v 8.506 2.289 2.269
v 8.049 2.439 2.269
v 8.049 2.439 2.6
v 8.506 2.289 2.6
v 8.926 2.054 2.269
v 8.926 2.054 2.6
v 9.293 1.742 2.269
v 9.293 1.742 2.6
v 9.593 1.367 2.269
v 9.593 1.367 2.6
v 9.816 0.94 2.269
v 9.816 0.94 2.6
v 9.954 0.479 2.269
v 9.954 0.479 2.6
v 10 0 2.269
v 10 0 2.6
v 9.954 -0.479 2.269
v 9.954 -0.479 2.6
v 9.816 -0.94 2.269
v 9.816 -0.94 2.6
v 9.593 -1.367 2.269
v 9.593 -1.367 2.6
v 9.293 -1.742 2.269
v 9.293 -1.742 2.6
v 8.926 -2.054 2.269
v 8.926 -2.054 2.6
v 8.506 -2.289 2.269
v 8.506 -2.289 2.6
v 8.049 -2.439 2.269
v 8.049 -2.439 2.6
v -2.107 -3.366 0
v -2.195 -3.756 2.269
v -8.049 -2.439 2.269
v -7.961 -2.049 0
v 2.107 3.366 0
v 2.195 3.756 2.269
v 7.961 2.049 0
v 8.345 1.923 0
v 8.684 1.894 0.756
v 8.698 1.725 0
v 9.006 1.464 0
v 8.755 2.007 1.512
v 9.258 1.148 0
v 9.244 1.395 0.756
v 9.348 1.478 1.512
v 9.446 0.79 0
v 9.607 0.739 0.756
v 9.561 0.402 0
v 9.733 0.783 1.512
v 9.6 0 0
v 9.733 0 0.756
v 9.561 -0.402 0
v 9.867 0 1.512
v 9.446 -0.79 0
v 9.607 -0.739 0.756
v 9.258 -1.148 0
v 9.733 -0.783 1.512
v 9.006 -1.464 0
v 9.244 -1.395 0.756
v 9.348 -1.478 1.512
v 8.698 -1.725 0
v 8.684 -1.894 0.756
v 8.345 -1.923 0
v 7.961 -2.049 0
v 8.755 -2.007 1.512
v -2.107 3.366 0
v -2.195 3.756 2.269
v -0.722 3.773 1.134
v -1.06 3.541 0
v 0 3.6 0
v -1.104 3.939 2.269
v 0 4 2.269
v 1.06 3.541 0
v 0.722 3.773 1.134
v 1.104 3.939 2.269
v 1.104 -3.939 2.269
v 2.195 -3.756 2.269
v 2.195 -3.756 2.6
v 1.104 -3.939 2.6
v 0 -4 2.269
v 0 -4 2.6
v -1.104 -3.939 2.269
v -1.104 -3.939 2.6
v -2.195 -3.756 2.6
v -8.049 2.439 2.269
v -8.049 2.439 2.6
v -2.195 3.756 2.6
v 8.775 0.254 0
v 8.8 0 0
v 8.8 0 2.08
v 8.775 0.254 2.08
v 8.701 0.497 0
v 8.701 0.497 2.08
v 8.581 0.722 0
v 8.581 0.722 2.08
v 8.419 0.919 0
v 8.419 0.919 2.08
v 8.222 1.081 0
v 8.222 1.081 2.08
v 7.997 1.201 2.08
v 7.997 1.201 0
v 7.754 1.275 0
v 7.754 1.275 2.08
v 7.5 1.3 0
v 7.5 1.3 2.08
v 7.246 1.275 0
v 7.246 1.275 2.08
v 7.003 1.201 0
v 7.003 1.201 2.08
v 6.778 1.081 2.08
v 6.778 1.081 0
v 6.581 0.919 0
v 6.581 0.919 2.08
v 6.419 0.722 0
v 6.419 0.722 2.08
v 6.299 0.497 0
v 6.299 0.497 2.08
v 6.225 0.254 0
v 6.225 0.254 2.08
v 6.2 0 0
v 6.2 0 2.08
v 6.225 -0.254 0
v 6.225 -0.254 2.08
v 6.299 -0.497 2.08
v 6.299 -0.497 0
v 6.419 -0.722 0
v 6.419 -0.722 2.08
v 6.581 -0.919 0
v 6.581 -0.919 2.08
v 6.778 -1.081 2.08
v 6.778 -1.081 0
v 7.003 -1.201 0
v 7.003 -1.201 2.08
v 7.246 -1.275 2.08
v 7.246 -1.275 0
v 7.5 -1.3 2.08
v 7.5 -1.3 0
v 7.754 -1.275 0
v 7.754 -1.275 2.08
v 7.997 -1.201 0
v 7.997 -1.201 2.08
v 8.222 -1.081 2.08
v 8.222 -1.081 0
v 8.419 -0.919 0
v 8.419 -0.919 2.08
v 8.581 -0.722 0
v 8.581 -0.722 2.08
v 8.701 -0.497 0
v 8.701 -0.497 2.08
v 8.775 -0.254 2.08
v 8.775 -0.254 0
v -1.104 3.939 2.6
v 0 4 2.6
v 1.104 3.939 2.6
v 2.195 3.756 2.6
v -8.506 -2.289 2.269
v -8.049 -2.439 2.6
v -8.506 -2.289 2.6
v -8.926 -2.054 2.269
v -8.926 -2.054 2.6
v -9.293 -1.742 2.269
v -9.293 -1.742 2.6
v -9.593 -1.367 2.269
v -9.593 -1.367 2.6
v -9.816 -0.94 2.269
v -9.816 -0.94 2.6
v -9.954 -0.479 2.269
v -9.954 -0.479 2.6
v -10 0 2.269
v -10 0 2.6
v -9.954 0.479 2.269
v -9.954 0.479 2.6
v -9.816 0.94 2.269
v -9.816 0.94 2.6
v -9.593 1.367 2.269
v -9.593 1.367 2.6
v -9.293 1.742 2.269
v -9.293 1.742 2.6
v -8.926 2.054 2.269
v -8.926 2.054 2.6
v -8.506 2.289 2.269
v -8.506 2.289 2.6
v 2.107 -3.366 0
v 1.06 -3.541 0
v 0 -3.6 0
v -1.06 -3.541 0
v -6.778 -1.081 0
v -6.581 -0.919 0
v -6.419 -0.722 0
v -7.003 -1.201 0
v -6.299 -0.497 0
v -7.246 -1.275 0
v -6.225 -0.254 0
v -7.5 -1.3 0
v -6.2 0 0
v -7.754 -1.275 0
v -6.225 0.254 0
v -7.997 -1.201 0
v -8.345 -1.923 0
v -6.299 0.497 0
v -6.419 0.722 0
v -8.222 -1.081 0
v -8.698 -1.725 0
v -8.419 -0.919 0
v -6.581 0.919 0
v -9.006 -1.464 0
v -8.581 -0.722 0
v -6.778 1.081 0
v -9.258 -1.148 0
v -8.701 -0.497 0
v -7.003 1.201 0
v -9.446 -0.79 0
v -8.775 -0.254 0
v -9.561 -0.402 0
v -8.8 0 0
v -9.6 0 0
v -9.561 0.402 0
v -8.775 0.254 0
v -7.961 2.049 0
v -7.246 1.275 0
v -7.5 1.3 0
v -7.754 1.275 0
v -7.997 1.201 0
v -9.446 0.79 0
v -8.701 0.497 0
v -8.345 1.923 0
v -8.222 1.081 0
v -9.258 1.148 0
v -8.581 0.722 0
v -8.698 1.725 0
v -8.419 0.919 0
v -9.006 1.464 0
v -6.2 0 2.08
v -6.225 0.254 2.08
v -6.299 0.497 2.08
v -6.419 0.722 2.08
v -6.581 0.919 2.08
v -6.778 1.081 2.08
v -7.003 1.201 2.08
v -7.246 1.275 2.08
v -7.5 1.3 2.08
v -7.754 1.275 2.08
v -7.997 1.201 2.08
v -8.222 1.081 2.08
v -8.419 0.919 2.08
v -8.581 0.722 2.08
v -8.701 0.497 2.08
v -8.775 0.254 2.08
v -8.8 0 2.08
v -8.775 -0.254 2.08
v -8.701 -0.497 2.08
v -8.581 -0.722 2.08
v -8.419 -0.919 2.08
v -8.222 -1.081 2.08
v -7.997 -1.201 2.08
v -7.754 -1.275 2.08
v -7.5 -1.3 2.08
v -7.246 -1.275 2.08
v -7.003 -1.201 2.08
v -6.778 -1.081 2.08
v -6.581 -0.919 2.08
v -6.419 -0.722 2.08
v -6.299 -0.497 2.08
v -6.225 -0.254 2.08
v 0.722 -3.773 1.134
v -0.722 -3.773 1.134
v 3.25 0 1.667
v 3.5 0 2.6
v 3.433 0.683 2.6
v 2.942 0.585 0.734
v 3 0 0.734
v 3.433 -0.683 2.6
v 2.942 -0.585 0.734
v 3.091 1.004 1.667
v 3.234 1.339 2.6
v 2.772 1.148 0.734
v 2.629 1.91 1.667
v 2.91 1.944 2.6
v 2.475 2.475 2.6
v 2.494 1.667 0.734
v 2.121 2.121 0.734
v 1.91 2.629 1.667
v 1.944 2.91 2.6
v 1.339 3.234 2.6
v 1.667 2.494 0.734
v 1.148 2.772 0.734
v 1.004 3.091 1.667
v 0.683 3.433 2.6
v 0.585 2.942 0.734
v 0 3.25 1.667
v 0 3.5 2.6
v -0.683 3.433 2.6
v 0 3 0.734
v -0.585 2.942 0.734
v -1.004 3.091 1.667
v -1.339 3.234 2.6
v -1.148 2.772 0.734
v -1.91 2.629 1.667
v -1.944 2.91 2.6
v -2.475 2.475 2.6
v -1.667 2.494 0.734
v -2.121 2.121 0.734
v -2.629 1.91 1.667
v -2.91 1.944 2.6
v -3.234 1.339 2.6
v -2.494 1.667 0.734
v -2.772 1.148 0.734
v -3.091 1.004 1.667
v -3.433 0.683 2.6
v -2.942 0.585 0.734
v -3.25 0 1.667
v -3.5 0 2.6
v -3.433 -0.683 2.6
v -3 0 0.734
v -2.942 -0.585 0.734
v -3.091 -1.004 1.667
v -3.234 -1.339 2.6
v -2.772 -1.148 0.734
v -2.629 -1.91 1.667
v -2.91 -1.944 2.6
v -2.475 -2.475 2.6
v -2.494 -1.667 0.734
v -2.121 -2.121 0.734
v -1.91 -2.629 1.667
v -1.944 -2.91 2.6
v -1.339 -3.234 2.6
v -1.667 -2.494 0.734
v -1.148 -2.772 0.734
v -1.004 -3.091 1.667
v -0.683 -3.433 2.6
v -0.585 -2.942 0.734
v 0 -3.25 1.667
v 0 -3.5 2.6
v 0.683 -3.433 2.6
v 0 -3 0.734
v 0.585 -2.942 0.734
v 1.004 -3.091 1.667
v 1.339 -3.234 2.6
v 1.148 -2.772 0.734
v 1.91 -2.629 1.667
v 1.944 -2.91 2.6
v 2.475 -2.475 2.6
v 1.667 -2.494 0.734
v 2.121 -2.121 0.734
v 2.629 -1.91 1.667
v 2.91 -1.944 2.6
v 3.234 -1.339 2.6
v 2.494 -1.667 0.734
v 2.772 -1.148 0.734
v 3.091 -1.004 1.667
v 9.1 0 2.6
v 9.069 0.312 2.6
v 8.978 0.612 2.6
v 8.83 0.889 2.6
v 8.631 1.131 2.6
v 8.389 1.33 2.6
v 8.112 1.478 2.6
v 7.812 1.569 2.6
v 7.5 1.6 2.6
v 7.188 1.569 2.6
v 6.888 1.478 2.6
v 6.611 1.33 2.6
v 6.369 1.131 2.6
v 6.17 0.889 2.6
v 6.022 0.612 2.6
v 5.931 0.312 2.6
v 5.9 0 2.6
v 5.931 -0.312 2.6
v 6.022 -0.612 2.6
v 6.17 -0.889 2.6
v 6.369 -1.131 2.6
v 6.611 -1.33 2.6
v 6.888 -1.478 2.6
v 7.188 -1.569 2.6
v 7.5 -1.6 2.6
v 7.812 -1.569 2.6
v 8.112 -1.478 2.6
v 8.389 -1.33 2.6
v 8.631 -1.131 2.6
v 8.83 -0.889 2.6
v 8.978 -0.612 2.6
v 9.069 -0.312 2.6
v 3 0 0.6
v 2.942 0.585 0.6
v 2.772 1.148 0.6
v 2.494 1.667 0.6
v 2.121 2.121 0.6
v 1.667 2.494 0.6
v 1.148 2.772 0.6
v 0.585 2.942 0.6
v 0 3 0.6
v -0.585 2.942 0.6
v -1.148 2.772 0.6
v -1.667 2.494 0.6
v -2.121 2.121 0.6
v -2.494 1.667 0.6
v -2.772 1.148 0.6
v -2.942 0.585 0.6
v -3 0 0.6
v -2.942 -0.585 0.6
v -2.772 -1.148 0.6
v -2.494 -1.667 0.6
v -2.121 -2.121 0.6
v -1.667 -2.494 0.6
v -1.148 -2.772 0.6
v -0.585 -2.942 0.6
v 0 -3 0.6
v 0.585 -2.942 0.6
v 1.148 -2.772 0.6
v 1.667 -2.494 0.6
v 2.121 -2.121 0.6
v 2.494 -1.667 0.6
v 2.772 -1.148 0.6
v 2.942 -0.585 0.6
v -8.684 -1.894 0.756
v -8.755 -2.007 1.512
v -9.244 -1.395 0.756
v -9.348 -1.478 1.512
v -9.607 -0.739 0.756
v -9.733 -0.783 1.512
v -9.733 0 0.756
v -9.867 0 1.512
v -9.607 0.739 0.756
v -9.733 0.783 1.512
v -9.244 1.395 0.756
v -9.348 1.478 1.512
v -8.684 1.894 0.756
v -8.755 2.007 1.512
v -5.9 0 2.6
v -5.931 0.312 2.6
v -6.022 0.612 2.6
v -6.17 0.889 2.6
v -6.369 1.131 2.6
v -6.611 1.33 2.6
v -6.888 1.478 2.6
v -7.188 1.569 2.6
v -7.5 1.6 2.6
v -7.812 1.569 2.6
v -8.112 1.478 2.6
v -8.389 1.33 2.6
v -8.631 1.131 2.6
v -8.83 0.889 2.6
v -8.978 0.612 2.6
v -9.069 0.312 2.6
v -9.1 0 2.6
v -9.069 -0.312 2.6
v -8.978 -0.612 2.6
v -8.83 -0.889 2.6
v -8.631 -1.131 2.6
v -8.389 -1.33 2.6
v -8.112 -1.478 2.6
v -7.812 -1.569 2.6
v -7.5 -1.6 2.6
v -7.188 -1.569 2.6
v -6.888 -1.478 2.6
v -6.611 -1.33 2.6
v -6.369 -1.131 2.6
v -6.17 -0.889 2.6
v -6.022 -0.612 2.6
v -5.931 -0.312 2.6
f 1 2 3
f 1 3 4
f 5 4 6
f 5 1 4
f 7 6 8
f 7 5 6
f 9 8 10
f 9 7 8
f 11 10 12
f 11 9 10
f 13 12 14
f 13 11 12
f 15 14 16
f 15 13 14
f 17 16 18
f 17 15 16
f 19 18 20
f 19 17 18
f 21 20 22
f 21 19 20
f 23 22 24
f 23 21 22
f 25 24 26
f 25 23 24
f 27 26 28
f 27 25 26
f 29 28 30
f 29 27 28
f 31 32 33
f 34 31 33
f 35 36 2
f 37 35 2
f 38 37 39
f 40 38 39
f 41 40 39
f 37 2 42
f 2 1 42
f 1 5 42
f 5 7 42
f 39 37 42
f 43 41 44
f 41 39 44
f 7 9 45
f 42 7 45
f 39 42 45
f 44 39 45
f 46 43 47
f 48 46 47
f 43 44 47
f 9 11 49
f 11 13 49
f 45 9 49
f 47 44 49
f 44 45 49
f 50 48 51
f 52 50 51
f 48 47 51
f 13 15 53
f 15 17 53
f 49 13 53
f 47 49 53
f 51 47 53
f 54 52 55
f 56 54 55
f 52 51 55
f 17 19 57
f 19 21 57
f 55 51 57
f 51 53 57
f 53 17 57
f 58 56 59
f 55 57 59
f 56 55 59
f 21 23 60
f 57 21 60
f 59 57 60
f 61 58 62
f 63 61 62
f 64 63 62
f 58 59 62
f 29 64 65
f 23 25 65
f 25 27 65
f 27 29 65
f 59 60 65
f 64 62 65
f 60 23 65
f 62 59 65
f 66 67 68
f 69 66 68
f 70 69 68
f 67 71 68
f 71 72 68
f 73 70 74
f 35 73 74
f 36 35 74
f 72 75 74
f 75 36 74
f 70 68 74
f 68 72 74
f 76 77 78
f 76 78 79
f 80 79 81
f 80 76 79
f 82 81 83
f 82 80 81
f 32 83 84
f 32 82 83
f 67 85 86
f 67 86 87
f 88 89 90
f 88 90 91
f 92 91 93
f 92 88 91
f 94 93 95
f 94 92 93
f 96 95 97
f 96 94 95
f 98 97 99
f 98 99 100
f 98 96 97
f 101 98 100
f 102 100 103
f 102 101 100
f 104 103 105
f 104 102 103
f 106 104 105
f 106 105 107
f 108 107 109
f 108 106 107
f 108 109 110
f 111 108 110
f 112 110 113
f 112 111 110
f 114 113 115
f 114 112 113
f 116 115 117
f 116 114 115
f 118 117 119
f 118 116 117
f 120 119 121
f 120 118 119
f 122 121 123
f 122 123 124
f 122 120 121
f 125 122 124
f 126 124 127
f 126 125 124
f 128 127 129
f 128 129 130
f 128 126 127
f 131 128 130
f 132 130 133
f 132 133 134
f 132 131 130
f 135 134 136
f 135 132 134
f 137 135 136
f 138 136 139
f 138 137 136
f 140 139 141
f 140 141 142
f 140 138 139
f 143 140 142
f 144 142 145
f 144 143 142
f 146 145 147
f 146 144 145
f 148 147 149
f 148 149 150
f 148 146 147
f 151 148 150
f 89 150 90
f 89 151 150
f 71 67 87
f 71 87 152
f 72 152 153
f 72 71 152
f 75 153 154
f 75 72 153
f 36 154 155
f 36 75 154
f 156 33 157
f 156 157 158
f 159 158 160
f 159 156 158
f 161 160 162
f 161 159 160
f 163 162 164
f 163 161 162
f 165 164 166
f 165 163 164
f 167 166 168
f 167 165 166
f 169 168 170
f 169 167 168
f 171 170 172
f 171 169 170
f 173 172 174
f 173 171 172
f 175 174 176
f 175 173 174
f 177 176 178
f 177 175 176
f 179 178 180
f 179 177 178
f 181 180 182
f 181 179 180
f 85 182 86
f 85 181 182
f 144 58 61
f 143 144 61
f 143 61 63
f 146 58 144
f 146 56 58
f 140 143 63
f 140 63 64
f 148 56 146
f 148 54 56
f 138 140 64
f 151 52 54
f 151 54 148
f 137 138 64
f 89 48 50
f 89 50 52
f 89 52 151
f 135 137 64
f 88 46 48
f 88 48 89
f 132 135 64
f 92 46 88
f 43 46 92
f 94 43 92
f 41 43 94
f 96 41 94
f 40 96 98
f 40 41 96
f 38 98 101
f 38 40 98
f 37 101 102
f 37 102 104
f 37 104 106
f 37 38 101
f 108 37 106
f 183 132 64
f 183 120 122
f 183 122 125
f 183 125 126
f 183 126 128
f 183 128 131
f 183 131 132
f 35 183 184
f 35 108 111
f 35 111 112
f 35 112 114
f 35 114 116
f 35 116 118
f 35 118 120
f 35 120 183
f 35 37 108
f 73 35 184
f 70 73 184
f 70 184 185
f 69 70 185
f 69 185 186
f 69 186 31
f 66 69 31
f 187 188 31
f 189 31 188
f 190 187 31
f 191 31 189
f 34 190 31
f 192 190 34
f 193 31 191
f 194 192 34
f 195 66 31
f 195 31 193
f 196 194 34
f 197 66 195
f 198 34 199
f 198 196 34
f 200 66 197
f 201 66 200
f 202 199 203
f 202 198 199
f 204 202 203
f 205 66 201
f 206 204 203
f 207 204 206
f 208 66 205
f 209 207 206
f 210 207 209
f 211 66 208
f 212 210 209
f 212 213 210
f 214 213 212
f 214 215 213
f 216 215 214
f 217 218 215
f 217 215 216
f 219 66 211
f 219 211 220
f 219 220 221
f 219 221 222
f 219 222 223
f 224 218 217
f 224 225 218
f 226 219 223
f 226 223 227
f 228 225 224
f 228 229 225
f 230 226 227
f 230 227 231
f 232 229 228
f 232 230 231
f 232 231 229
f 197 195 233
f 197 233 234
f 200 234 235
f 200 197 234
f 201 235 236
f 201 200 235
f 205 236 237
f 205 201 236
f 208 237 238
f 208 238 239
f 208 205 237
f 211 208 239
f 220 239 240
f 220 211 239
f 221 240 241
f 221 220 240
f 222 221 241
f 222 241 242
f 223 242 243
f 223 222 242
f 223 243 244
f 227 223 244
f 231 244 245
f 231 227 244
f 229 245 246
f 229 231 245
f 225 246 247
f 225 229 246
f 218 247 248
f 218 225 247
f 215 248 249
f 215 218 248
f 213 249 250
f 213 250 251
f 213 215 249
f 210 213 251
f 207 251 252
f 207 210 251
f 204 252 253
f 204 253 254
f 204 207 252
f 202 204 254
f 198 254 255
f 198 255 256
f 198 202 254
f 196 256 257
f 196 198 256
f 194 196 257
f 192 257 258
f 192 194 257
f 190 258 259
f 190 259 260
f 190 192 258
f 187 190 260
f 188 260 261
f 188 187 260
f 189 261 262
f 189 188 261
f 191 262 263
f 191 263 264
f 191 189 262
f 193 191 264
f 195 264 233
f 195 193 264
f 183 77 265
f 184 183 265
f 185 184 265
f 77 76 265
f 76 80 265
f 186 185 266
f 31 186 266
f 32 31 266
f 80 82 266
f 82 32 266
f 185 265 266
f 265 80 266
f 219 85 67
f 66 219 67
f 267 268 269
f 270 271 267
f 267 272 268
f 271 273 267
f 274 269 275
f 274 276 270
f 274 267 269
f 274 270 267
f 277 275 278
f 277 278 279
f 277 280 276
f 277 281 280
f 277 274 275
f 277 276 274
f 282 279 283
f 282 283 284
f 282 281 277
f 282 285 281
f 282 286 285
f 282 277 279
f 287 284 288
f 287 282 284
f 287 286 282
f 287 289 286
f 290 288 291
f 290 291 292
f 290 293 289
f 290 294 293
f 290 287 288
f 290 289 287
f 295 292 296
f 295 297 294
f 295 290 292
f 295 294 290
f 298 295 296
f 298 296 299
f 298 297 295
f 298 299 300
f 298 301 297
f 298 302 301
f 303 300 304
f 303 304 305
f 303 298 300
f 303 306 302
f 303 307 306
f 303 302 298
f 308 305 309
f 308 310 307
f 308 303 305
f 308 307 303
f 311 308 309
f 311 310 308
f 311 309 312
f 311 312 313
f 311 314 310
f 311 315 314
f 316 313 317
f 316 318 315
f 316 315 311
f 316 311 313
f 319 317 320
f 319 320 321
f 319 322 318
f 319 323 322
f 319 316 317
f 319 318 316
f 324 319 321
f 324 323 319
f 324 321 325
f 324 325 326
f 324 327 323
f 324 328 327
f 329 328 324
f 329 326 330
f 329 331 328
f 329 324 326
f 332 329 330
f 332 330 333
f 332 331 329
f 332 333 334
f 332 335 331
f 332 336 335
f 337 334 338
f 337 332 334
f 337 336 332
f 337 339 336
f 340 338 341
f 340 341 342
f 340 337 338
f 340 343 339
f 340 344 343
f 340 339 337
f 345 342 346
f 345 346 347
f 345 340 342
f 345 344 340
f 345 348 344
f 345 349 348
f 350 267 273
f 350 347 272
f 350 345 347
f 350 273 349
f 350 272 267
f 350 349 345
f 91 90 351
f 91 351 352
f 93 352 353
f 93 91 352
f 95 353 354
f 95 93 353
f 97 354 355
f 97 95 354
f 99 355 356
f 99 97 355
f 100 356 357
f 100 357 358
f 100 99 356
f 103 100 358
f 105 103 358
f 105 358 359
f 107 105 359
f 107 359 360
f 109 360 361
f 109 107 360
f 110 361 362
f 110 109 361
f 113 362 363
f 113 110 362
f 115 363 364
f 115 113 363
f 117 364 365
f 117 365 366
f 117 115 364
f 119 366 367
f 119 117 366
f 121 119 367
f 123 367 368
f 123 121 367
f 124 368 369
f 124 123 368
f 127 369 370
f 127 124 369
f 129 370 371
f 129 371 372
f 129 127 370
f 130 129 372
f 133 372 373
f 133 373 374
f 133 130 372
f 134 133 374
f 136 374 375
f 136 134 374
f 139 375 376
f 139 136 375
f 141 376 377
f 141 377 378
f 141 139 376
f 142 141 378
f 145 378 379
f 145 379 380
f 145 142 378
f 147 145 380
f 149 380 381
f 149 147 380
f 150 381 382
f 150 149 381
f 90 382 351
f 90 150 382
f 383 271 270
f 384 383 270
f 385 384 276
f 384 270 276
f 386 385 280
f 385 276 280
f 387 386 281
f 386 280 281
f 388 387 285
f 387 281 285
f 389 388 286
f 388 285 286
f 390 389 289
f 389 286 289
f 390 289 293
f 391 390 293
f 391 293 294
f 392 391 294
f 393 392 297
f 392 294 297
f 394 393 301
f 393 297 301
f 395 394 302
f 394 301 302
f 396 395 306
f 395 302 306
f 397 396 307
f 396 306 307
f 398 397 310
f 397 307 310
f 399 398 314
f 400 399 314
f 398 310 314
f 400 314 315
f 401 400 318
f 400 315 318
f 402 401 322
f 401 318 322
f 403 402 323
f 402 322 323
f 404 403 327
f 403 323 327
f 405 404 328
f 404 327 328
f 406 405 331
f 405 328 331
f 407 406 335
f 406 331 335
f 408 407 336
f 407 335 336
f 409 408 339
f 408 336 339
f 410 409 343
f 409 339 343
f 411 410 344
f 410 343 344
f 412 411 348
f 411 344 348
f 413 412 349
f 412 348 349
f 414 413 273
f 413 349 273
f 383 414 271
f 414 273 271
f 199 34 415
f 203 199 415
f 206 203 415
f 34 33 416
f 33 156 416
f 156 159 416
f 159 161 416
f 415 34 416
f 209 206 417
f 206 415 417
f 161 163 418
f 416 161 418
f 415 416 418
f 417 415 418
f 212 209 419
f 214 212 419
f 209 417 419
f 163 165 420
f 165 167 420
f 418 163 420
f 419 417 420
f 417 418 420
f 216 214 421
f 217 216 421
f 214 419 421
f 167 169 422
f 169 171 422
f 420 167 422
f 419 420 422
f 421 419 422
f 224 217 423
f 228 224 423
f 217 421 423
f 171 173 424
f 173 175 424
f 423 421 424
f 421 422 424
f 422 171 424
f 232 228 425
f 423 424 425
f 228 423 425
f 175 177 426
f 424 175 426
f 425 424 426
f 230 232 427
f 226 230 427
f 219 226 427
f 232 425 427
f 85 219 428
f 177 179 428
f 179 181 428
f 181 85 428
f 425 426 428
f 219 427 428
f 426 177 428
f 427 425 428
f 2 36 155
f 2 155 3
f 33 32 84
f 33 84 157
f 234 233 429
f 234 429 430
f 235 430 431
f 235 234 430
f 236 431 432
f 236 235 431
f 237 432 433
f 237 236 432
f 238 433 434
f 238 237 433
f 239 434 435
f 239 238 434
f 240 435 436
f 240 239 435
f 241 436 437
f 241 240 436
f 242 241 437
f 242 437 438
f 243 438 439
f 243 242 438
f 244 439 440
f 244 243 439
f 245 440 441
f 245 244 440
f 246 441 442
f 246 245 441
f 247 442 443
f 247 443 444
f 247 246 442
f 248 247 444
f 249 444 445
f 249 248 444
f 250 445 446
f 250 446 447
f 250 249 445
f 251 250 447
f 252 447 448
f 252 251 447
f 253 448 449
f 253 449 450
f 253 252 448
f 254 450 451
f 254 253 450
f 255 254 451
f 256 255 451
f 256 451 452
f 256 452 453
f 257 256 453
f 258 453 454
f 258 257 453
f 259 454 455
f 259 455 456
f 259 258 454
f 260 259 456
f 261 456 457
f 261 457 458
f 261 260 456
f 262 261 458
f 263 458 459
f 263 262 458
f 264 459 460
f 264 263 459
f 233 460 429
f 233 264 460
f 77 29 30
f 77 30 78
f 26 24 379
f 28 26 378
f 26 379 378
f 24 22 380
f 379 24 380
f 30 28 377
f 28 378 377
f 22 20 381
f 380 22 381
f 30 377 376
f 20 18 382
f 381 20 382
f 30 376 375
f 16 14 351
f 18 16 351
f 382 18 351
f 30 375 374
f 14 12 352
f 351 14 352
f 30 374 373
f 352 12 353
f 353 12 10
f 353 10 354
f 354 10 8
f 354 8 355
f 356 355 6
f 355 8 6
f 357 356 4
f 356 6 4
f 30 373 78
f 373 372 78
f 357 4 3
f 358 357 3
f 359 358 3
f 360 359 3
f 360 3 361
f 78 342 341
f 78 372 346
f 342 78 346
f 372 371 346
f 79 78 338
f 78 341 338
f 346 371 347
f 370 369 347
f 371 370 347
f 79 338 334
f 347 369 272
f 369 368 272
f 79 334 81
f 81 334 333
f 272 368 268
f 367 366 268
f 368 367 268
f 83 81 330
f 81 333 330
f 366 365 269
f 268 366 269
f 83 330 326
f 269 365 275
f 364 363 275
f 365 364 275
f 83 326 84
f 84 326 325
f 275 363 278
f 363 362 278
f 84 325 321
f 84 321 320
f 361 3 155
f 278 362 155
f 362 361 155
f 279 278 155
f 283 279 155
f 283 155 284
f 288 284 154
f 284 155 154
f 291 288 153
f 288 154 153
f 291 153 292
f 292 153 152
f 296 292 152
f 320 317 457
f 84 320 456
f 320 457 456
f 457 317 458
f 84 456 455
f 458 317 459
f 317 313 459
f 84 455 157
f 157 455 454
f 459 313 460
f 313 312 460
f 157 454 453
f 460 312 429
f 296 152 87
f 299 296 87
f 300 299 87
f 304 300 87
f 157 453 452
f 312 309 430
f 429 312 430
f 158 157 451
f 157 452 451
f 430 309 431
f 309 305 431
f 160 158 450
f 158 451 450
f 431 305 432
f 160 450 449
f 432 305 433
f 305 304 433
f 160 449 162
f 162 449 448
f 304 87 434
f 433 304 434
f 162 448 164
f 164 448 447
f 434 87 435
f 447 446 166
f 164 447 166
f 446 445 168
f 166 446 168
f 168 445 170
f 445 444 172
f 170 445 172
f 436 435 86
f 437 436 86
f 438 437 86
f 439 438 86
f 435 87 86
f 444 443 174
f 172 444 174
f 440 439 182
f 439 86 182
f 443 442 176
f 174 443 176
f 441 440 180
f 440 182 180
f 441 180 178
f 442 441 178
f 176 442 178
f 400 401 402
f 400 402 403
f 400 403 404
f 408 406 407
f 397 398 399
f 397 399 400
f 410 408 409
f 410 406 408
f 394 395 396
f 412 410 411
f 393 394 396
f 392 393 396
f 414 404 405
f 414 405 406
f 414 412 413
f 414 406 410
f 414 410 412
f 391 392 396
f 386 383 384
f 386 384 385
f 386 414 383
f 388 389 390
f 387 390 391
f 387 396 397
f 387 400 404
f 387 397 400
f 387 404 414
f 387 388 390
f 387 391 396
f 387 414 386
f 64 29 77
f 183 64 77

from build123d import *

# Parameters (mm, degrees)
SKETCH1_R           = 1.3
BOSS_EXTRUDE1_DEPTH = 2.6
SKETCH2_R           = 3
CUT_EXTRUDE1_DEPTH  = 2
CHAMFER1_SIZE       = 0.4
CHAMFER1_SIZE2      = 2.268512728
CHAMFER2_SIZE       = 0.5
CHAMFER2_SIZE2      = 1.866025404
CHAMFER3_SIZE       = 0.3
CHAMFER3_SIZE2      = 0.519615242


with BuildPart() as part:
    # Sketch1 → Boss-Extrude1 (new body)
    with BuildSketch(Plane.XY):
        with BuildLine():
            Line((-8.048780488, 2.43902439), (-2.195121951, 3.756097561))
            ThreePointArc((-2.195121951, 3.756097561), (0, 4), (2.195121951, 3.756097561))
            Line((2.195121951, 3.756097561), (8.048780488, 2.43902439))
            ThreePointArc((8.048780488, 2.43902439), (10, 0), (8.048780488, -2.43902439))
            Line((8.048780488, -2.43902439), (2.195121951, -3.756097561))
            ThreePointArc((2.195121951, -3.756097561), (0, -4), (-2.195121951, -3.756097561))
            Line((-2.195121951, -3.756097561), (-8.048780488, -2.43902439))
            ThreePointArc((-8.048780488, -2.43902439), (-10, 0), (-8.048780488, 2.43902439))
        make_face()
        with Locations((7.5, 0)):
            Circle(SKETCH1_R, mode=Mode.SUBTRACT)
        with Locations((-7.5, 0)):
            Circle(SKETCH1_R, mode=Mode.SUBTRACT)
    extrude(amount=BOSS_EXTRUDE1_DEPTH)

    # Sketch2 → Cut-Extrude1 (cut)
    with BuildSketch(Plane.XY.offset(2.6)):
        Circle(SKETCH2_R)
    extrude(amount=-CUT_EXTRUDE1_DEPTH, mode=Mode.SUBTRACT)

    # Chamfer1
    chamfer1_edges = [part.edges().sort_by_distance(p)[0] for p in [
        (-5.12195122, -3.097560976, 0),
        (-10, 0, 0),
        (-5.12195122, 3.097560976, 0),
        (0, 4, 0),
        (5.12195122, 3.097560976, 0),
        (10, 0, 0),
        (5.12195122, -3.097560976, 0),
        (0, -4, 0),
    ]]
    chamfer1_side = [part.faces().sort_by_distance(p)[0] for p in [
        (0, 0, 0),
    ]]
    chamfer(chamfer1_edges, length=CHAMFER1_SIZE, length2=CHAMFER1_SIZE2, reference=chamfer1_side[0])

    # Chamfer2
    chamfer2_edges = [part.edges().sort_by_distance(p)[0] for p in [
        (-3, 0, 2.6),
    ]]
    chamfer2_side = [part.faces().sort_by_distance(p)[0] for p in [
        (-5.074666846, 2.887408203, 2.6),
    ]]
    chamfer(chamfer2_edges, length=CHAMFER2_SIZE, length2=CHAMFER2_SIZE2, reference=chamfer2_side[0])

    # Chamfer3
    chamfer3_edges = [part.edges().sort_by_distance(p)[0] for p in [
        (6.2, 0, 2.6),
        (-8.8, 0, 2.6),
    ]]
    chamfer3_side = [part.faces().sort_by_distance(p)[0] for p in [
        (-3.715406592, 0, 2.6),
    ]]
    chamfer(chamfer3_edges, length=CHAMFER3_SIZE, length2=CHAMFER3_SIZE2, reference=chamfer3_side[0])


solid = part.part
